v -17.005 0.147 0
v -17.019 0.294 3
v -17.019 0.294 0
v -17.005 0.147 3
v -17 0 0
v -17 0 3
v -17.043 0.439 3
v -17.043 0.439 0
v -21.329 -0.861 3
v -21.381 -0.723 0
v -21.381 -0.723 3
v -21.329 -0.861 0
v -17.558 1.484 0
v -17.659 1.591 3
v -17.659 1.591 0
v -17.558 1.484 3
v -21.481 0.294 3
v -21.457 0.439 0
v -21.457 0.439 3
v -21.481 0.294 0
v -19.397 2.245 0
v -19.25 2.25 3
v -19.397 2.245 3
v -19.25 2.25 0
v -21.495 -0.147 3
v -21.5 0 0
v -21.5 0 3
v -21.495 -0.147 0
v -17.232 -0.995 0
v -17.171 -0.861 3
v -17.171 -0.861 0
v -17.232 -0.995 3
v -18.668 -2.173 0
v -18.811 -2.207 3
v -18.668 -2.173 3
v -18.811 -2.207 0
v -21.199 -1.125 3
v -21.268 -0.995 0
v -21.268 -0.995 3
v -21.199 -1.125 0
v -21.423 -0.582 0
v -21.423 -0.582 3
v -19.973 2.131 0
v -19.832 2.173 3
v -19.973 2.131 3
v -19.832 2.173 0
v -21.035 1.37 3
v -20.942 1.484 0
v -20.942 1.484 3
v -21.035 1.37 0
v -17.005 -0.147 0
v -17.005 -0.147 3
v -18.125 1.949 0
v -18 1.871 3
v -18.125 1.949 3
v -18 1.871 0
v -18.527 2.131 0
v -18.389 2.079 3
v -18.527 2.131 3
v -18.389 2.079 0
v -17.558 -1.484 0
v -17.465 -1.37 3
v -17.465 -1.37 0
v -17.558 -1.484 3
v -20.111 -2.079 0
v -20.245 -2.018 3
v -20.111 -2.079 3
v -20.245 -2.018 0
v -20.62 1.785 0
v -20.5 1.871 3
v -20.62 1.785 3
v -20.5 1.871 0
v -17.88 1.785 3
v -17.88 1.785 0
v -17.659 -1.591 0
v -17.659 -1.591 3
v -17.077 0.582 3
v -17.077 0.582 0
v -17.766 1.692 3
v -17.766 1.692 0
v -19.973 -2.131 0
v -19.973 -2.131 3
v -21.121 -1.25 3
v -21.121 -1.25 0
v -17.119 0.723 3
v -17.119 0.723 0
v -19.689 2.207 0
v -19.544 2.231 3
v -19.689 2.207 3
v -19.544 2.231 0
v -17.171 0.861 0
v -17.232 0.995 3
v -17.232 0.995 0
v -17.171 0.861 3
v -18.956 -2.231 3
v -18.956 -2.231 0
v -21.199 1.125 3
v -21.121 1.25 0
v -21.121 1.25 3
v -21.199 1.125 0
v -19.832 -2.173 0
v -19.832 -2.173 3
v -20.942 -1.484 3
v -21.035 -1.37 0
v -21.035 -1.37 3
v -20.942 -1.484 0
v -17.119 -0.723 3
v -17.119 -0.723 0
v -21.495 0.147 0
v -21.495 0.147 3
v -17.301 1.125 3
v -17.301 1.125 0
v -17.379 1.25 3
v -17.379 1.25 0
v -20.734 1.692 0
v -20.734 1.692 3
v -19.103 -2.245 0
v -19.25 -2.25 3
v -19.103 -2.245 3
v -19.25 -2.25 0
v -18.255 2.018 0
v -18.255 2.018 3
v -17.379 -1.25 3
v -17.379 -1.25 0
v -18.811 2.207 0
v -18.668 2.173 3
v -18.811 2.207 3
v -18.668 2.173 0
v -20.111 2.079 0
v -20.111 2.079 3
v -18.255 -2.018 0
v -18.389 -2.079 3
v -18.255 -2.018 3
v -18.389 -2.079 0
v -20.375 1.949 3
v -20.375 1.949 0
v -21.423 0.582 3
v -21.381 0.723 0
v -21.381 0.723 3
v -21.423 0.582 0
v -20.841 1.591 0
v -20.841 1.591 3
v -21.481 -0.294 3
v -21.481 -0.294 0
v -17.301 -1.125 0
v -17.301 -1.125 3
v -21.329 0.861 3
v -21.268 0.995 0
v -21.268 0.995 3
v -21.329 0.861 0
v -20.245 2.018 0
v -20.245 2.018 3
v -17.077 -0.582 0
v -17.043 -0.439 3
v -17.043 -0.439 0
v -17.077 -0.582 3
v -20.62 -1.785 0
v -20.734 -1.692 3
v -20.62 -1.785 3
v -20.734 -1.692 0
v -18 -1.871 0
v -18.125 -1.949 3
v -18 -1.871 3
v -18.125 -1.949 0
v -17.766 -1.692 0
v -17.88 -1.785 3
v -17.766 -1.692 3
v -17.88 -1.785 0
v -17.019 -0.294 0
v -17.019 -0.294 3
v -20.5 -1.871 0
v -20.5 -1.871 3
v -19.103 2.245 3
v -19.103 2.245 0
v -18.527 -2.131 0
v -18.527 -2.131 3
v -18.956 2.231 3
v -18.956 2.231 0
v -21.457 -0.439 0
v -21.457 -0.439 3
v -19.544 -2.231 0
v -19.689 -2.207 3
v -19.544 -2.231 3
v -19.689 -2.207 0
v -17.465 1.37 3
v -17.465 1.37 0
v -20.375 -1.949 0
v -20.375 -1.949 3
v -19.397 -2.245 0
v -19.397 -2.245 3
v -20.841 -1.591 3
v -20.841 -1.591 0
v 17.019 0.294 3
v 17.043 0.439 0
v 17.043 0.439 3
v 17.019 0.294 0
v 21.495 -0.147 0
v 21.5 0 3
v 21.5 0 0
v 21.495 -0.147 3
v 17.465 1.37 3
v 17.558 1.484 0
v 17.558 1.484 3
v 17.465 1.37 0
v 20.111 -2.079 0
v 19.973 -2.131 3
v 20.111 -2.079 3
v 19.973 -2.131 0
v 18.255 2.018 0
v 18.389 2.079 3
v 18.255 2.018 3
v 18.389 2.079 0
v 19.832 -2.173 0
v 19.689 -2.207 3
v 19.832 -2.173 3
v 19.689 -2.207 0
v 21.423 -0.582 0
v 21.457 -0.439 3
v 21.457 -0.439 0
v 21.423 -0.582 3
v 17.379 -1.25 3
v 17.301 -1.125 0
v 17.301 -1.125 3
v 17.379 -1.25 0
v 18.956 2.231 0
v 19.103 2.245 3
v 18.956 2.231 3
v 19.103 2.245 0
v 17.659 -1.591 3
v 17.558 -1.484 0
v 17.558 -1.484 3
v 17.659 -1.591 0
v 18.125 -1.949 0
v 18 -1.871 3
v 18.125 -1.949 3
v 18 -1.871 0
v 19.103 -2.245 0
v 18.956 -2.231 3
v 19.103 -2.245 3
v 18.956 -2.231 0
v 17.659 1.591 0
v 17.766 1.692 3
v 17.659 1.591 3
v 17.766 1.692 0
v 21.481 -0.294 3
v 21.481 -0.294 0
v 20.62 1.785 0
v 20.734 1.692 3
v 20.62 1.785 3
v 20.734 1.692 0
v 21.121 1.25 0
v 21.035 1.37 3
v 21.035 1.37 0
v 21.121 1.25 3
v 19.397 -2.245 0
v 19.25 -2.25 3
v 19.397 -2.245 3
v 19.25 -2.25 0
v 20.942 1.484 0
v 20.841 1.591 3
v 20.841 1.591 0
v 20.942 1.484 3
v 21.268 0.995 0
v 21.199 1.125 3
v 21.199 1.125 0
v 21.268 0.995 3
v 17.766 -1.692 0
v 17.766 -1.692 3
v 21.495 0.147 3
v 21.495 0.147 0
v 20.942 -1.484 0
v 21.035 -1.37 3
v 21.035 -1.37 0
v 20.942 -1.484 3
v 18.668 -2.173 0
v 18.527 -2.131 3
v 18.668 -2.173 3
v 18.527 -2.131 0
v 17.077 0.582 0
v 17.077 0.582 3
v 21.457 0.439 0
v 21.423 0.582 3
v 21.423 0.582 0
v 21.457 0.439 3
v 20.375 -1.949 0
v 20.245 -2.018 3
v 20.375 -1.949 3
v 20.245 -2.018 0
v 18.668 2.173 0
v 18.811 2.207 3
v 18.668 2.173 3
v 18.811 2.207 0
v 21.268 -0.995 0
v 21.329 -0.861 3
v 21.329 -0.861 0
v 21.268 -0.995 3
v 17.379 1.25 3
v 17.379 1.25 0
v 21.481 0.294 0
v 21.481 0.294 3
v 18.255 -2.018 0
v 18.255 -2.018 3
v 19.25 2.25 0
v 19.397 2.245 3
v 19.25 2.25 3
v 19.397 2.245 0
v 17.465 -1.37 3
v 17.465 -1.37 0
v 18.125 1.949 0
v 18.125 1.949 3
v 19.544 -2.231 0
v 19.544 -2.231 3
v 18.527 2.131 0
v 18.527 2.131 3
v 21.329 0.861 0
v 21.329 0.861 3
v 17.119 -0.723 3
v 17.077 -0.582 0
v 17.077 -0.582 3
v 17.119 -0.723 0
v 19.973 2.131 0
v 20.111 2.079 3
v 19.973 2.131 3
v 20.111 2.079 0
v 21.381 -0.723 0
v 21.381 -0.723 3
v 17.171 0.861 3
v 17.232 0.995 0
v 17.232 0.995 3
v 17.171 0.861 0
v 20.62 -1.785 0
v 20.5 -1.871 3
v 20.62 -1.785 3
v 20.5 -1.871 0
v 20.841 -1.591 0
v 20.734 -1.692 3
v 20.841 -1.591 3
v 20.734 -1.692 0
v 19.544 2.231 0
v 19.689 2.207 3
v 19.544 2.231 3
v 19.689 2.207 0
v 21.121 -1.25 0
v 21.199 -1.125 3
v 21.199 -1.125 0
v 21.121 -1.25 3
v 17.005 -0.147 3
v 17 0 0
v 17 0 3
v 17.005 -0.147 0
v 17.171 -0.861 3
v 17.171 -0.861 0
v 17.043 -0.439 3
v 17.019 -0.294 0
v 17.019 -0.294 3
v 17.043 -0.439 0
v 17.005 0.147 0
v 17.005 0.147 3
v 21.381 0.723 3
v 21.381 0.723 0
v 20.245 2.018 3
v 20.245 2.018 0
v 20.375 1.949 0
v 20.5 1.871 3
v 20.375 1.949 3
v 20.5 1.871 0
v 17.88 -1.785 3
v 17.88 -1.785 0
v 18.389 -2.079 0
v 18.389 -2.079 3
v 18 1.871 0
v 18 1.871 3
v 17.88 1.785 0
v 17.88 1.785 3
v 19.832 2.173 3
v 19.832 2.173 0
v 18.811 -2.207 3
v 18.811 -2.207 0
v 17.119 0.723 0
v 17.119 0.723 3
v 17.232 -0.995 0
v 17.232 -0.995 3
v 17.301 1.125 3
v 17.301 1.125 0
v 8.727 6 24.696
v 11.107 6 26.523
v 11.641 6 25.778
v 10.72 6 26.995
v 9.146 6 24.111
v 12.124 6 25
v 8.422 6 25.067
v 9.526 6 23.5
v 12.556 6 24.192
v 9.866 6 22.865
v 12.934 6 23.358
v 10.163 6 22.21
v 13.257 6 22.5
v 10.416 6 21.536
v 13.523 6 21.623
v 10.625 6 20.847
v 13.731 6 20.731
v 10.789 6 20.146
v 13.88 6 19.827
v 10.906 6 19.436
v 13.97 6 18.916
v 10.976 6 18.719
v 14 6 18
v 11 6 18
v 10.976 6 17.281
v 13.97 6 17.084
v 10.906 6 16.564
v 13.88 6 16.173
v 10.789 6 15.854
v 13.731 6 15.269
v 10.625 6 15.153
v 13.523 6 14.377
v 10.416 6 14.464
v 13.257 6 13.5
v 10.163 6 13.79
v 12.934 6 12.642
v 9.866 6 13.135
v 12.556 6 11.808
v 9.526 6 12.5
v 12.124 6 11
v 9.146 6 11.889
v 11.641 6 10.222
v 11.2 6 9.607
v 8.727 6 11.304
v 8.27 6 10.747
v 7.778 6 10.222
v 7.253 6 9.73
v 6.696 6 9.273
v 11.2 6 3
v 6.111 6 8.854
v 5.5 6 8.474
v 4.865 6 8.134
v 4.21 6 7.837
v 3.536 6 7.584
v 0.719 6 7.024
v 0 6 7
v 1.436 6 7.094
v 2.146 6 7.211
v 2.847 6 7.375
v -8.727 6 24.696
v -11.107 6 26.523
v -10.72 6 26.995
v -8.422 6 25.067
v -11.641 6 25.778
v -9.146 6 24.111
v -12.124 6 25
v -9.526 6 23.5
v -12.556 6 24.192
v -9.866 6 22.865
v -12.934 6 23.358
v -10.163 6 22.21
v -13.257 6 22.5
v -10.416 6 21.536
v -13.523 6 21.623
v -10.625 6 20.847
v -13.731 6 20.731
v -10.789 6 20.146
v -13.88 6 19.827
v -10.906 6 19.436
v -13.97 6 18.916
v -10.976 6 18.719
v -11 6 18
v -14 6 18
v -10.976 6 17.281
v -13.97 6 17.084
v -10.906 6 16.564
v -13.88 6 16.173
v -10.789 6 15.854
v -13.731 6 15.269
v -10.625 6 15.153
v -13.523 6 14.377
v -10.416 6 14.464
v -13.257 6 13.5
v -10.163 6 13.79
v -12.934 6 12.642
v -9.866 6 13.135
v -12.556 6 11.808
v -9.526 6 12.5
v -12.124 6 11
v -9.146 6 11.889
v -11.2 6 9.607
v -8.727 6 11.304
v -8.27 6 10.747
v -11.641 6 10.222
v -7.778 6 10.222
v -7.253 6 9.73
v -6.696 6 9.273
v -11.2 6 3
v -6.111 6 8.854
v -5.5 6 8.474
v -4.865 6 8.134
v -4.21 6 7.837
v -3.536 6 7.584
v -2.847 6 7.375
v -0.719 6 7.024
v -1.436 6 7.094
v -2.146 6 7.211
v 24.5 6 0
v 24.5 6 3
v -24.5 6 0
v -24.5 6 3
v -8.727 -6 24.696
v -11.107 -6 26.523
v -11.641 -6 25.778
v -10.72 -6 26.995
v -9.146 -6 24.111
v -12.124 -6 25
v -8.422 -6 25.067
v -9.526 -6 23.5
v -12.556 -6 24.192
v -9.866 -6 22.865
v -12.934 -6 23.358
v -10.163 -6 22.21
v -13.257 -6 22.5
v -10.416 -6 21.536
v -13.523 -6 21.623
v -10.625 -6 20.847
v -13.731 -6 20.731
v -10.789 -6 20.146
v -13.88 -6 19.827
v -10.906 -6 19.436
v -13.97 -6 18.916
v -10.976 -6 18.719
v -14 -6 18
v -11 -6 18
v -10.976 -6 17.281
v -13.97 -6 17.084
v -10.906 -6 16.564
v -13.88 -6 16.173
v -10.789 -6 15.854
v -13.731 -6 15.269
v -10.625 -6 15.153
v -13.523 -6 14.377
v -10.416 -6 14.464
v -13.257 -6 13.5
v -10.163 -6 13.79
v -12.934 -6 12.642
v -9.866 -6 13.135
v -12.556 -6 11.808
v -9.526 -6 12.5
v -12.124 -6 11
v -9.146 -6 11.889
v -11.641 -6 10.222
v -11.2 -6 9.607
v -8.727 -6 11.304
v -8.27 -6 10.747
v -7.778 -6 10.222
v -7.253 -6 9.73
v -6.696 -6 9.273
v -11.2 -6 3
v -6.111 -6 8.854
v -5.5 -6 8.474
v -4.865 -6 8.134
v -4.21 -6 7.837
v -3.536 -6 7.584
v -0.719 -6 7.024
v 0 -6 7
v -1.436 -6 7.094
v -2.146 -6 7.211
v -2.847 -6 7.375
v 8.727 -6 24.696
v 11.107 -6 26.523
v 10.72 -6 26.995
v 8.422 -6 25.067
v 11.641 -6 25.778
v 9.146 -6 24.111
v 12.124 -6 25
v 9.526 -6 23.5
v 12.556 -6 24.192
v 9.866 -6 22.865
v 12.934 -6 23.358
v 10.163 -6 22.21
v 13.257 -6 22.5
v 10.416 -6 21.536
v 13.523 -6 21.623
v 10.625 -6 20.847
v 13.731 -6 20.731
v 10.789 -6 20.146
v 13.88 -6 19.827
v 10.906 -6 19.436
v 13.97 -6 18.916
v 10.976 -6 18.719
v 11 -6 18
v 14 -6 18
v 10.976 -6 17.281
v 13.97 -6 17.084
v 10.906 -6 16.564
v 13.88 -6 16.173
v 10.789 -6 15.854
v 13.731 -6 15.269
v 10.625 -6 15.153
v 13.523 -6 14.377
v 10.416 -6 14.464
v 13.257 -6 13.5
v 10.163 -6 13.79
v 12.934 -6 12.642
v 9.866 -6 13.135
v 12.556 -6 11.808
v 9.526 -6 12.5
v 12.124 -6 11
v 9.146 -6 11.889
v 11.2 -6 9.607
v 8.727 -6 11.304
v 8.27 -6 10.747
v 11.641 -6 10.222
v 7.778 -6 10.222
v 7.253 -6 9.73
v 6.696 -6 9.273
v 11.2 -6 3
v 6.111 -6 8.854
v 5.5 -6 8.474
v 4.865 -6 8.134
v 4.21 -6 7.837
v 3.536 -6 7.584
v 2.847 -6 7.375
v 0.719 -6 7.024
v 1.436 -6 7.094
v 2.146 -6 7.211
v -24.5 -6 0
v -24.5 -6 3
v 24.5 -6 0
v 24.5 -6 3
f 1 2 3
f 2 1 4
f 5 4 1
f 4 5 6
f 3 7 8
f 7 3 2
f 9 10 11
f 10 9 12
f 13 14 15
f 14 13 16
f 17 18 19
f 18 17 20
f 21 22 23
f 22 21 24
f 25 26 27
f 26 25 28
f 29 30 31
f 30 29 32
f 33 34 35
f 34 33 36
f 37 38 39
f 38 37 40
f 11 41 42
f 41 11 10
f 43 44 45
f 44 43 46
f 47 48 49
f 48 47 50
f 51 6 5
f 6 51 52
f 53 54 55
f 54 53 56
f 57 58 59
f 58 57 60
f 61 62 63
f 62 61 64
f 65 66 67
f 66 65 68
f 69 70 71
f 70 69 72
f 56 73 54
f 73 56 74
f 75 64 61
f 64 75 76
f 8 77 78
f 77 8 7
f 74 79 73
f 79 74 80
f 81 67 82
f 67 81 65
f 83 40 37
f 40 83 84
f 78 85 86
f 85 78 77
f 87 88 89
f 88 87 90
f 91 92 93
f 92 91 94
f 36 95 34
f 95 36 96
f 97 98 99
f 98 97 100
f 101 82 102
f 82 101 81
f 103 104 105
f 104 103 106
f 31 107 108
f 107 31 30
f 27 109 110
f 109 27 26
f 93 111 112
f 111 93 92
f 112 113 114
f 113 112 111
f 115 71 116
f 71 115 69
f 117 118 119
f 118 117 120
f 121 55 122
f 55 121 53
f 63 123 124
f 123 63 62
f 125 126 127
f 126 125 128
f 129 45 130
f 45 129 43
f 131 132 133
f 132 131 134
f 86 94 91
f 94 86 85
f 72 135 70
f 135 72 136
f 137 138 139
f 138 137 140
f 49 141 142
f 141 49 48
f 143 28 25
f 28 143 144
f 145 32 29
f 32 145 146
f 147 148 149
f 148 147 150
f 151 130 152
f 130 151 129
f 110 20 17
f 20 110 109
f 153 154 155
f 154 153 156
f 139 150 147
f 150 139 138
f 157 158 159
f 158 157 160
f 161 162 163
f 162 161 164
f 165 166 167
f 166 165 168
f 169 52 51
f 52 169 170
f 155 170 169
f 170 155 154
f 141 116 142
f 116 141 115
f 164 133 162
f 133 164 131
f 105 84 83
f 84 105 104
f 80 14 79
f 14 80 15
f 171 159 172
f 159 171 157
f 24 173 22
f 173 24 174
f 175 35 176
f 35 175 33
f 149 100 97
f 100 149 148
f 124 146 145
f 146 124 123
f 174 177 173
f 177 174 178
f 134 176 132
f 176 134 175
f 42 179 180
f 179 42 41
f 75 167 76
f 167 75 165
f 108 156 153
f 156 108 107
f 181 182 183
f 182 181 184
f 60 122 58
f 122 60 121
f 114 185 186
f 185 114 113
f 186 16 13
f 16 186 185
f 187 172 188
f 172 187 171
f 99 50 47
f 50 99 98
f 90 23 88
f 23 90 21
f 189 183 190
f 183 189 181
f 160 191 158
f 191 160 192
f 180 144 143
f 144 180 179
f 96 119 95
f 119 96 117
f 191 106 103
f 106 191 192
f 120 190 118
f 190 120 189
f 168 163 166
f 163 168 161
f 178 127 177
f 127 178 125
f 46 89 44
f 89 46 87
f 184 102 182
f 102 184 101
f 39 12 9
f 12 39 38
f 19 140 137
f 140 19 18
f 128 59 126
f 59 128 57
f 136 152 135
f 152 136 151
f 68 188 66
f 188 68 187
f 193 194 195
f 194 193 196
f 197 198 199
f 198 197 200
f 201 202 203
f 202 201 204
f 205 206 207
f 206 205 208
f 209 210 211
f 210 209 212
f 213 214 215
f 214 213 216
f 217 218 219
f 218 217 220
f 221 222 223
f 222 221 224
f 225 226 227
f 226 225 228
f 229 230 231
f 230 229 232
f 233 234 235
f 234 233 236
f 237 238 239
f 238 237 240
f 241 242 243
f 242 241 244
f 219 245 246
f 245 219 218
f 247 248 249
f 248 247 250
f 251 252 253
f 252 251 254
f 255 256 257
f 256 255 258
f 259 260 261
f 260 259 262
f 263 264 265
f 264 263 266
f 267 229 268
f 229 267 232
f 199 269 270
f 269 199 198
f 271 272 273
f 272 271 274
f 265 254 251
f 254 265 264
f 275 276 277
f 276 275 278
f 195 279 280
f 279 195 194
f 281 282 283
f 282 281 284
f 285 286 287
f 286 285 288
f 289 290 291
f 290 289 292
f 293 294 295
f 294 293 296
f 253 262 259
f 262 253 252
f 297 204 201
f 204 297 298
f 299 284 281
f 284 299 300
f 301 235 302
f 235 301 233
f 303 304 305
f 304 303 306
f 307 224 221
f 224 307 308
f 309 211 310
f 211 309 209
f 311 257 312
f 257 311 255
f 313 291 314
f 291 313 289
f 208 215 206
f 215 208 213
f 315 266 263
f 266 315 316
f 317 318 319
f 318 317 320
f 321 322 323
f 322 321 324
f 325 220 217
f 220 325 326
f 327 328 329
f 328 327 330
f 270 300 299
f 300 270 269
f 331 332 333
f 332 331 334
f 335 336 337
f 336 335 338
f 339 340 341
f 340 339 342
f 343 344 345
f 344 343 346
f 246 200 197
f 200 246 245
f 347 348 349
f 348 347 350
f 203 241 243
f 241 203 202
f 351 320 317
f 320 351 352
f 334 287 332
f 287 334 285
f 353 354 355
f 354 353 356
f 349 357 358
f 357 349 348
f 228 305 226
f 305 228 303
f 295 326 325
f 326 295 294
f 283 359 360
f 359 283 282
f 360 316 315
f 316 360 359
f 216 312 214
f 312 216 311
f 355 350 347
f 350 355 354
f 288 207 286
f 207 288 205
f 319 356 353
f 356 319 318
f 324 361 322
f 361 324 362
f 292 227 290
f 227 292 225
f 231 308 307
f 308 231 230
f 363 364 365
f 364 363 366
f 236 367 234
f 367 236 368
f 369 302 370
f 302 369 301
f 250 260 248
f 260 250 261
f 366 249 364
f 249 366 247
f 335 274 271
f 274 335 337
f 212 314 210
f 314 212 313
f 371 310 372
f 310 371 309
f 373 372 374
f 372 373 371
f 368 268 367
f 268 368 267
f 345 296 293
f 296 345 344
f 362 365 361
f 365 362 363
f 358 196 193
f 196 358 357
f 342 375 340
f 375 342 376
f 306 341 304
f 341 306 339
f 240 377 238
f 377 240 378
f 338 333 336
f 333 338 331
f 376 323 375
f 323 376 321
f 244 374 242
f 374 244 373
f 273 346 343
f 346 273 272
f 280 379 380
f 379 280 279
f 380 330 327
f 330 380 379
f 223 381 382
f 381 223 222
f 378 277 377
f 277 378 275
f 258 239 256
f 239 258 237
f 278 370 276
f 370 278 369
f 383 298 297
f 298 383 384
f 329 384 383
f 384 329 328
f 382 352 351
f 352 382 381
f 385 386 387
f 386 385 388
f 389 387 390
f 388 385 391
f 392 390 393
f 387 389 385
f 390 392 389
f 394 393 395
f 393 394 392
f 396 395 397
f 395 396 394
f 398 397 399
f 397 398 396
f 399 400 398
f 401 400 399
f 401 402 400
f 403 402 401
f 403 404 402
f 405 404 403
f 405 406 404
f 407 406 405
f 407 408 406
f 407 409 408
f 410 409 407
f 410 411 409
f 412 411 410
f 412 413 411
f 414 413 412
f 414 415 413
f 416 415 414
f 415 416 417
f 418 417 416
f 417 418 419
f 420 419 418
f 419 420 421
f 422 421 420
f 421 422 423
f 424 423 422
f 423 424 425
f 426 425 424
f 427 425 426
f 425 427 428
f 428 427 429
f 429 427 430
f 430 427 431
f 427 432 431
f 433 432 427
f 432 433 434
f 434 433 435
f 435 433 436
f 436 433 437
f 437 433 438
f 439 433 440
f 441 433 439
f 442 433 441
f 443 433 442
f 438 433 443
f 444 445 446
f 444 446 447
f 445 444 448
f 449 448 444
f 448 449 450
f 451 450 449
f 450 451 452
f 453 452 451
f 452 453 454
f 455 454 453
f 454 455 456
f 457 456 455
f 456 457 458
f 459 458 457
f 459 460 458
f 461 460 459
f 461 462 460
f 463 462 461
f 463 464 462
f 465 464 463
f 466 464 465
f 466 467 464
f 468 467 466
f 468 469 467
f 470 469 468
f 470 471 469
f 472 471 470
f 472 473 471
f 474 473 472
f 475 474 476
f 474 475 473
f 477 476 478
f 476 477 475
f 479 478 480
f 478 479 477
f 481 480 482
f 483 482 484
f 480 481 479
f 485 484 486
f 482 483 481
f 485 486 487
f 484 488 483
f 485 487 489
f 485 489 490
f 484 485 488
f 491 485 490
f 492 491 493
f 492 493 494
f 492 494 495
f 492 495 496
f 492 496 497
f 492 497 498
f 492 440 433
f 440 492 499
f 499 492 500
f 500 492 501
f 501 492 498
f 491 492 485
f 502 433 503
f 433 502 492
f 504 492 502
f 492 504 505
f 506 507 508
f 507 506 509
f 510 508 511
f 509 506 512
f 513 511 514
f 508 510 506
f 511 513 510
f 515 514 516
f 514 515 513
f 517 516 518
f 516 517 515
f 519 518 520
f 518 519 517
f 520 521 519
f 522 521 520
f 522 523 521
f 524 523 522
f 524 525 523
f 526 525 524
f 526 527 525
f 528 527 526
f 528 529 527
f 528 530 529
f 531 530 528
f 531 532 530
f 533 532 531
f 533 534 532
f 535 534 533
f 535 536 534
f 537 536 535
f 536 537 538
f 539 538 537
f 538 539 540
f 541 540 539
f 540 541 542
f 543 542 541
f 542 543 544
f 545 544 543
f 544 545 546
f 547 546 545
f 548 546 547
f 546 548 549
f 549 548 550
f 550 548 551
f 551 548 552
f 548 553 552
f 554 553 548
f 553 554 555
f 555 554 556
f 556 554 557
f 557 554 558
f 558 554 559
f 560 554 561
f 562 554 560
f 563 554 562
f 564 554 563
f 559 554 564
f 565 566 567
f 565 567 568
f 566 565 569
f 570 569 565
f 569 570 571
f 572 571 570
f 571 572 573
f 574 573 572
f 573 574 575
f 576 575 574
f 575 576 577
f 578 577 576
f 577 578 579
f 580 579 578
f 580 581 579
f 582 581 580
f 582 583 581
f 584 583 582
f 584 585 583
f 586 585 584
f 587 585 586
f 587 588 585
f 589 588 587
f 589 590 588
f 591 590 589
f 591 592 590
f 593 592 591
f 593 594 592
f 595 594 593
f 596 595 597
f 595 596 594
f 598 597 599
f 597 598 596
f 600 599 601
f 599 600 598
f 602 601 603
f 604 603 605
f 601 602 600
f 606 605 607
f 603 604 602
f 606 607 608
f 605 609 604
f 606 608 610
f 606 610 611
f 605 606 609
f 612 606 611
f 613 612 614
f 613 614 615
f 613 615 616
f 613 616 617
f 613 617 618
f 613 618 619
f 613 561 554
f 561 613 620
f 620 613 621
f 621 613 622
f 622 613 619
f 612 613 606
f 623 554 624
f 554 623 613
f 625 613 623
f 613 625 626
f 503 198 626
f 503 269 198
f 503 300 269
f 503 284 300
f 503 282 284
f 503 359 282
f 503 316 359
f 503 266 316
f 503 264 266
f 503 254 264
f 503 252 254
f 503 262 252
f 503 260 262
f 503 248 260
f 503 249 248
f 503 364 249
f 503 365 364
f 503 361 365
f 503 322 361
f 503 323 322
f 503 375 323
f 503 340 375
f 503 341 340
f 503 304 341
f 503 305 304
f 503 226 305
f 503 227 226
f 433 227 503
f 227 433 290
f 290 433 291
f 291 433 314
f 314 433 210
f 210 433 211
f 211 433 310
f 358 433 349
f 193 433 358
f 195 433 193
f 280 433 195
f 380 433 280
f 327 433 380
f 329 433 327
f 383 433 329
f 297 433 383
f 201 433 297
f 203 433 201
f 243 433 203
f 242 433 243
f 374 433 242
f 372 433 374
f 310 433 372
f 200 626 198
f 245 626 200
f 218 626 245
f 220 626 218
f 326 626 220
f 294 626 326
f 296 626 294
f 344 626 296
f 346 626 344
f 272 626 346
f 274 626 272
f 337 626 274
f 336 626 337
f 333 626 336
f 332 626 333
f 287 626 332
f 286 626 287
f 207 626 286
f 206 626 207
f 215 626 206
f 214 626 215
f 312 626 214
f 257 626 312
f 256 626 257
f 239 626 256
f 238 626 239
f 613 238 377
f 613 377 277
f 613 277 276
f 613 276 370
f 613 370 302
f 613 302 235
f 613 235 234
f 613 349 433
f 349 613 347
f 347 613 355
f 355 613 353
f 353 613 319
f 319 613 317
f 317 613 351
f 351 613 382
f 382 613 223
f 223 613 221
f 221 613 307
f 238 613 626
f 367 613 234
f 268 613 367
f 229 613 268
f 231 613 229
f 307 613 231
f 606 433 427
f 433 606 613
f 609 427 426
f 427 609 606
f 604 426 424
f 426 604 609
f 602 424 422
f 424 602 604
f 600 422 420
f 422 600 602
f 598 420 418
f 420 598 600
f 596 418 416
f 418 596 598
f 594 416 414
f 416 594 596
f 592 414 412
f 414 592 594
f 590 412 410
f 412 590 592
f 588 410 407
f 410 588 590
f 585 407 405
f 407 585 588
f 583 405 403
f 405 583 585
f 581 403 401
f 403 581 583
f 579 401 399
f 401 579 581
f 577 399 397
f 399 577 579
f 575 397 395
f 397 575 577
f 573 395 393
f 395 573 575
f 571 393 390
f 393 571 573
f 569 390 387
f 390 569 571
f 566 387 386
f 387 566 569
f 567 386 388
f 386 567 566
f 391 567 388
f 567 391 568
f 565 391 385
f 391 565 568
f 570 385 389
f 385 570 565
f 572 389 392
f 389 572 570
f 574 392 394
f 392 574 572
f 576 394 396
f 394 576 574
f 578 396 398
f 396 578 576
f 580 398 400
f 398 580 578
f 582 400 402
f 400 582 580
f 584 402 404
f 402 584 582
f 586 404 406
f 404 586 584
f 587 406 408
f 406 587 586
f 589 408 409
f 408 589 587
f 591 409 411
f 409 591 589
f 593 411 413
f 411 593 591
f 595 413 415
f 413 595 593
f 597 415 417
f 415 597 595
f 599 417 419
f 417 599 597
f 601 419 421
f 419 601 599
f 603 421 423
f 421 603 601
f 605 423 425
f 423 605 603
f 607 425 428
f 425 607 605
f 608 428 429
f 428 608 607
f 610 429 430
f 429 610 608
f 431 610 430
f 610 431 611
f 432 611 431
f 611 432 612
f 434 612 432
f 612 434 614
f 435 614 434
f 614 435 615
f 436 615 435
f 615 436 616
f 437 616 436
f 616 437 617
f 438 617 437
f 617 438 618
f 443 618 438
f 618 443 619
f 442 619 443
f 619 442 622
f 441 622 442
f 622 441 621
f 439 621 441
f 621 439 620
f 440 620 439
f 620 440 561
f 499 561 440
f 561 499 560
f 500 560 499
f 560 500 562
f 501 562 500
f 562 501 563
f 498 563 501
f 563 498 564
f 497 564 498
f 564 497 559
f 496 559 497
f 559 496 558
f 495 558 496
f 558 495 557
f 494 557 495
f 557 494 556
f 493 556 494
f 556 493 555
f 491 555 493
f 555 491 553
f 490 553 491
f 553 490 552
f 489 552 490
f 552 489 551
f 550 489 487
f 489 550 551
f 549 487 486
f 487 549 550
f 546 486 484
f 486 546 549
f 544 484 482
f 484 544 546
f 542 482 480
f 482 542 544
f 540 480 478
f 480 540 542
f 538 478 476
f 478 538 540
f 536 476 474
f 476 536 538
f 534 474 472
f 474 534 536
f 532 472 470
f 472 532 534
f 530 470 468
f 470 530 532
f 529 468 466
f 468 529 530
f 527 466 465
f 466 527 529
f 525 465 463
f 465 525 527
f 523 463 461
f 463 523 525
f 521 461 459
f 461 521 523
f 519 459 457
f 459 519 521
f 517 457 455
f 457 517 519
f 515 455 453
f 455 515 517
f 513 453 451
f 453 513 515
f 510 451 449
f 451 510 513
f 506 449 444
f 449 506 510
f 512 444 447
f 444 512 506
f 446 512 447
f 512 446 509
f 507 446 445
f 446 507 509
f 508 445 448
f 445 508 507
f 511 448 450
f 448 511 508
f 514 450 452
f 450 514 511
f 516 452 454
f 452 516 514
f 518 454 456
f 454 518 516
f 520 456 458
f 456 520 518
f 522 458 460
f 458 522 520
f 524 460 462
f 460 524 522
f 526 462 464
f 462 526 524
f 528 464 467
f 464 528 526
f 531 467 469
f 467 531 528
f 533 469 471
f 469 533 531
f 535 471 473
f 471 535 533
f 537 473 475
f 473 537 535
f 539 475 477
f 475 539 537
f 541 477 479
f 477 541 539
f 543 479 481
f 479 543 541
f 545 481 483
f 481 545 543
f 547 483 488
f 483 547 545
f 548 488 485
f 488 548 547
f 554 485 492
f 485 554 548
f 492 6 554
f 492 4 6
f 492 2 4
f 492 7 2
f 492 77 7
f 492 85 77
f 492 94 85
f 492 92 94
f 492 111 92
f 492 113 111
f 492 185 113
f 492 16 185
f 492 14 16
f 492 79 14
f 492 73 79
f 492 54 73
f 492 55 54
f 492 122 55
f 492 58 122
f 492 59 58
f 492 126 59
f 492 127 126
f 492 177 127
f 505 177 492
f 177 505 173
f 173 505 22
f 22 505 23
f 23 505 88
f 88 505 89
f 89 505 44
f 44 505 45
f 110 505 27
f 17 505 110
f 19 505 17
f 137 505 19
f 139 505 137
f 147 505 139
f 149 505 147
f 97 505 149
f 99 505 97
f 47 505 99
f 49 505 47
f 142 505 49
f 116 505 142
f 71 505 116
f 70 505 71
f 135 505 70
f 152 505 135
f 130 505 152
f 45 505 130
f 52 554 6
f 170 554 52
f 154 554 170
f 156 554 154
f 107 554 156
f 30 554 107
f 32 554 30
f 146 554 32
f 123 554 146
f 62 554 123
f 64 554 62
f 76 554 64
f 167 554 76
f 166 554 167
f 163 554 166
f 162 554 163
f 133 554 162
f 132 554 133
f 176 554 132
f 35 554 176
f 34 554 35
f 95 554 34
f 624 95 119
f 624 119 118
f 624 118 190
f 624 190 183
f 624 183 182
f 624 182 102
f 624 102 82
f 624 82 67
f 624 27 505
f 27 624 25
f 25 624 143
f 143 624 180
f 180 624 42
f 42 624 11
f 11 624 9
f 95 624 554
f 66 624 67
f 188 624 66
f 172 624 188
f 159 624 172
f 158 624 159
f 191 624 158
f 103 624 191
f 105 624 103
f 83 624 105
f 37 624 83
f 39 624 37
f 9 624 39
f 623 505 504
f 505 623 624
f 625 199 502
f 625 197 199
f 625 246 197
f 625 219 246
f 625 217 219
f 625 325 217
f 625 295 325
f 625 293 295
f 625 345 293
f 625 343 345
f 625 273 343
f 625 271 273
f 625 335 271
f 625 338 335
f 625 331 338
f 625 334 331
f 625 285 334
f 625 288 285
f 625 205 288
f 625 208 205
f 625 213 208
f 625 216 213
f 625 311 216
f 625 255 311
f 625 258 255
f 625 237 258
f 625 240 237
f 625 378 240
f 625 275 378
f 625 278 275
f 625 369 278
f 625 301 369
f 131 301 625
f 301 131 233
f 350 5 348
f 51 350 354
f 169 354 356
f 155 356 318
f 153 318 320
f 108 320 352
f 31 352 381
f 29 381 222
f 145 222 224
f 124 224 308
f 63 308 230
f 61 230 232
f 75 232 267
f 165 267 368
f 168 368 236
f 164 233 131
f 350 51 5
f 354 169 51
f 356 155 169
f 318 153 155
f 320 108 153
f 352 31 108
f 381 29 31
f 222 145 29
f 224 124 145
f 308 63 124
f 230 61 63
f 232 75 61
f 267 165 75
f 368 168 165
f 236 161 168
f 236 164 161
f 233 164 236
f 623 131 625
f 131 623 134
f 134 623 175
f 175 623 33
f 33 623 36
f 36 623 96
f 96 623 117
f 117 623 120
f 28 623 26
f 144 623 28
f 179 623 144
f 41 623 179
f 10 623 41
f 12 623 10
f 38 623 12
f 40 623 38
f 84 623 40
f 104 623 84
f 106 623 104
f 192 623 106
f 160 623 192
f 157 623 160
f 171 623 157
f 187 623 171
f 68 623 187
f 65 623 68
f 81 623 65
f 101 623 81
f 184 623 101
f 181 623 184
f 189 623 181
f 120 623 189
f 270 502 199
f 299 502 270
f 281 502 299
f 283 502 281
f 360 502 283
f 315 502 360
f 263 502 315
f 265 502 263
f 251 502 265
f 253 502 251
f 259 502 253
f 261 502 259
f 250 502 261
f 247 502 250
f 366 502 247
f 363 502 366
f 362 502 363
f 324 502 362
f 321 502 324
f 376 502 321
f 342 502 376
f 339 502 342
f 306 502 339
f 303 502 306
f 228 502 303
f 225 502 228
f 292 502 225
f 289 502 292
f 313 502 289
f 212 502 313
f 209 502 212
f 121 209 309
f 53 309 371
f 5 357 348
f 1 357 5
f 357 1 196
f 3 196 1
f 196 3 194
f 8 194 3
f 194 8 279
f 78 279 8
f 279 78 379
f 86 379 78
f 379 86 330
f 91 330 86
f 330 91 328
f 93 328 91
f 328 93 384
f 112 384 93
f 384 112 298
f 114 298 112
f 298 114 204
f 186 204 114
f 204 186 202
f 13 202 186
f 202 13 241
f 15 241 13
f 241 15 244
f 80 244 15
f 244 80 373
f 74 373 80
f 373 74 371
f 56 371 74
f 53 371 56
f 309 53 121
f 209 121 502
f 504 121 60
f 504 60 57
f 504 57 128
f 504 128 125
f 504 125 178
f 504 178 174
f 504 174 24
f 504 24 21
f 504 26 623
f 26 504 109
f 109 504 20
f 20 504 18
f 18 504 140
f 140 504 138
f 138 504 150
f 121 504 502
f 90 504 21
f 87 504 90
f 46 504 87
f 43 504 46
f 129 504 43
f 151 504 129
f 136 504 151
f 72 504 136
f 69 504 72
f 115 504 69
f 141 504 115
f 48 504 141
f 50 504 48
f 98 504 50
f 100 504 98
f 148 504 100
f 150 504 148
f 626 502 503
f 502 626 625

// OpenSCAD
// Rohr-Clip zum Anschrauben – MESH.ritl Vorlage
/* [Rohr] */
// Rohr-Außendurchmesser (mm)
rohr_d = 22; // [6:0.5:110]
// Öffnung des Clips (Grad)
oeffnung = 100; // [60:5:160]
/* [Halter] */
// Breite des Clips (mm)
breite = 12; // [5:1:40]
// Wandstärke (mm)
wand = 3; // [1.2:0.2:8]
// Abstand Rohr bis Wand (mm)
abstand = 4; // [0:1:40]
// Schraube Durchmesser (mm, 0 = ohne)
schraube = 4.5; // [0:0.5:8]
// Form des Fußes
fuss = "Lasche"; // [Lasche, Schmal]
/* [Hidden] */
$fn = 96;
R = rohr_d/2; Ra = R + wand; H = abstand + wand + R;
L = fuss == "Lasche" ? Ra*2 + 2*(schraube + 6) : Ra*1.6;
module profil() difference() {
  union() {
    translate([0, H]) circle(r = Ra);
    translate([-L/2, 0]) square([L, wand]);
    translate([-Ra*0.8, 0]) square([Ra*1.6, H]);
  }
  translate([0, H]) circle(r = R);
  translate([0, H]) polygon([[0, 0], [3*Ra*sin(-oeffnung/2), 3*Ra*cos(oeffnung/2)], [3*Ra*sin(oeffnung/2), 3*Ra*cos(oeffnung/2)]]);
}
difference() {
  rotate([90, 0, 0]) linear_extrude(height = breite, center = true) profil();
  if (schraube > 0 && fuss == "Lasche") for (s = [-1, 1]) translate([s*(L/2 - schraube/2 - 3), 0, -1]) cylinder(d = schraube, h = wand + 2);
}
